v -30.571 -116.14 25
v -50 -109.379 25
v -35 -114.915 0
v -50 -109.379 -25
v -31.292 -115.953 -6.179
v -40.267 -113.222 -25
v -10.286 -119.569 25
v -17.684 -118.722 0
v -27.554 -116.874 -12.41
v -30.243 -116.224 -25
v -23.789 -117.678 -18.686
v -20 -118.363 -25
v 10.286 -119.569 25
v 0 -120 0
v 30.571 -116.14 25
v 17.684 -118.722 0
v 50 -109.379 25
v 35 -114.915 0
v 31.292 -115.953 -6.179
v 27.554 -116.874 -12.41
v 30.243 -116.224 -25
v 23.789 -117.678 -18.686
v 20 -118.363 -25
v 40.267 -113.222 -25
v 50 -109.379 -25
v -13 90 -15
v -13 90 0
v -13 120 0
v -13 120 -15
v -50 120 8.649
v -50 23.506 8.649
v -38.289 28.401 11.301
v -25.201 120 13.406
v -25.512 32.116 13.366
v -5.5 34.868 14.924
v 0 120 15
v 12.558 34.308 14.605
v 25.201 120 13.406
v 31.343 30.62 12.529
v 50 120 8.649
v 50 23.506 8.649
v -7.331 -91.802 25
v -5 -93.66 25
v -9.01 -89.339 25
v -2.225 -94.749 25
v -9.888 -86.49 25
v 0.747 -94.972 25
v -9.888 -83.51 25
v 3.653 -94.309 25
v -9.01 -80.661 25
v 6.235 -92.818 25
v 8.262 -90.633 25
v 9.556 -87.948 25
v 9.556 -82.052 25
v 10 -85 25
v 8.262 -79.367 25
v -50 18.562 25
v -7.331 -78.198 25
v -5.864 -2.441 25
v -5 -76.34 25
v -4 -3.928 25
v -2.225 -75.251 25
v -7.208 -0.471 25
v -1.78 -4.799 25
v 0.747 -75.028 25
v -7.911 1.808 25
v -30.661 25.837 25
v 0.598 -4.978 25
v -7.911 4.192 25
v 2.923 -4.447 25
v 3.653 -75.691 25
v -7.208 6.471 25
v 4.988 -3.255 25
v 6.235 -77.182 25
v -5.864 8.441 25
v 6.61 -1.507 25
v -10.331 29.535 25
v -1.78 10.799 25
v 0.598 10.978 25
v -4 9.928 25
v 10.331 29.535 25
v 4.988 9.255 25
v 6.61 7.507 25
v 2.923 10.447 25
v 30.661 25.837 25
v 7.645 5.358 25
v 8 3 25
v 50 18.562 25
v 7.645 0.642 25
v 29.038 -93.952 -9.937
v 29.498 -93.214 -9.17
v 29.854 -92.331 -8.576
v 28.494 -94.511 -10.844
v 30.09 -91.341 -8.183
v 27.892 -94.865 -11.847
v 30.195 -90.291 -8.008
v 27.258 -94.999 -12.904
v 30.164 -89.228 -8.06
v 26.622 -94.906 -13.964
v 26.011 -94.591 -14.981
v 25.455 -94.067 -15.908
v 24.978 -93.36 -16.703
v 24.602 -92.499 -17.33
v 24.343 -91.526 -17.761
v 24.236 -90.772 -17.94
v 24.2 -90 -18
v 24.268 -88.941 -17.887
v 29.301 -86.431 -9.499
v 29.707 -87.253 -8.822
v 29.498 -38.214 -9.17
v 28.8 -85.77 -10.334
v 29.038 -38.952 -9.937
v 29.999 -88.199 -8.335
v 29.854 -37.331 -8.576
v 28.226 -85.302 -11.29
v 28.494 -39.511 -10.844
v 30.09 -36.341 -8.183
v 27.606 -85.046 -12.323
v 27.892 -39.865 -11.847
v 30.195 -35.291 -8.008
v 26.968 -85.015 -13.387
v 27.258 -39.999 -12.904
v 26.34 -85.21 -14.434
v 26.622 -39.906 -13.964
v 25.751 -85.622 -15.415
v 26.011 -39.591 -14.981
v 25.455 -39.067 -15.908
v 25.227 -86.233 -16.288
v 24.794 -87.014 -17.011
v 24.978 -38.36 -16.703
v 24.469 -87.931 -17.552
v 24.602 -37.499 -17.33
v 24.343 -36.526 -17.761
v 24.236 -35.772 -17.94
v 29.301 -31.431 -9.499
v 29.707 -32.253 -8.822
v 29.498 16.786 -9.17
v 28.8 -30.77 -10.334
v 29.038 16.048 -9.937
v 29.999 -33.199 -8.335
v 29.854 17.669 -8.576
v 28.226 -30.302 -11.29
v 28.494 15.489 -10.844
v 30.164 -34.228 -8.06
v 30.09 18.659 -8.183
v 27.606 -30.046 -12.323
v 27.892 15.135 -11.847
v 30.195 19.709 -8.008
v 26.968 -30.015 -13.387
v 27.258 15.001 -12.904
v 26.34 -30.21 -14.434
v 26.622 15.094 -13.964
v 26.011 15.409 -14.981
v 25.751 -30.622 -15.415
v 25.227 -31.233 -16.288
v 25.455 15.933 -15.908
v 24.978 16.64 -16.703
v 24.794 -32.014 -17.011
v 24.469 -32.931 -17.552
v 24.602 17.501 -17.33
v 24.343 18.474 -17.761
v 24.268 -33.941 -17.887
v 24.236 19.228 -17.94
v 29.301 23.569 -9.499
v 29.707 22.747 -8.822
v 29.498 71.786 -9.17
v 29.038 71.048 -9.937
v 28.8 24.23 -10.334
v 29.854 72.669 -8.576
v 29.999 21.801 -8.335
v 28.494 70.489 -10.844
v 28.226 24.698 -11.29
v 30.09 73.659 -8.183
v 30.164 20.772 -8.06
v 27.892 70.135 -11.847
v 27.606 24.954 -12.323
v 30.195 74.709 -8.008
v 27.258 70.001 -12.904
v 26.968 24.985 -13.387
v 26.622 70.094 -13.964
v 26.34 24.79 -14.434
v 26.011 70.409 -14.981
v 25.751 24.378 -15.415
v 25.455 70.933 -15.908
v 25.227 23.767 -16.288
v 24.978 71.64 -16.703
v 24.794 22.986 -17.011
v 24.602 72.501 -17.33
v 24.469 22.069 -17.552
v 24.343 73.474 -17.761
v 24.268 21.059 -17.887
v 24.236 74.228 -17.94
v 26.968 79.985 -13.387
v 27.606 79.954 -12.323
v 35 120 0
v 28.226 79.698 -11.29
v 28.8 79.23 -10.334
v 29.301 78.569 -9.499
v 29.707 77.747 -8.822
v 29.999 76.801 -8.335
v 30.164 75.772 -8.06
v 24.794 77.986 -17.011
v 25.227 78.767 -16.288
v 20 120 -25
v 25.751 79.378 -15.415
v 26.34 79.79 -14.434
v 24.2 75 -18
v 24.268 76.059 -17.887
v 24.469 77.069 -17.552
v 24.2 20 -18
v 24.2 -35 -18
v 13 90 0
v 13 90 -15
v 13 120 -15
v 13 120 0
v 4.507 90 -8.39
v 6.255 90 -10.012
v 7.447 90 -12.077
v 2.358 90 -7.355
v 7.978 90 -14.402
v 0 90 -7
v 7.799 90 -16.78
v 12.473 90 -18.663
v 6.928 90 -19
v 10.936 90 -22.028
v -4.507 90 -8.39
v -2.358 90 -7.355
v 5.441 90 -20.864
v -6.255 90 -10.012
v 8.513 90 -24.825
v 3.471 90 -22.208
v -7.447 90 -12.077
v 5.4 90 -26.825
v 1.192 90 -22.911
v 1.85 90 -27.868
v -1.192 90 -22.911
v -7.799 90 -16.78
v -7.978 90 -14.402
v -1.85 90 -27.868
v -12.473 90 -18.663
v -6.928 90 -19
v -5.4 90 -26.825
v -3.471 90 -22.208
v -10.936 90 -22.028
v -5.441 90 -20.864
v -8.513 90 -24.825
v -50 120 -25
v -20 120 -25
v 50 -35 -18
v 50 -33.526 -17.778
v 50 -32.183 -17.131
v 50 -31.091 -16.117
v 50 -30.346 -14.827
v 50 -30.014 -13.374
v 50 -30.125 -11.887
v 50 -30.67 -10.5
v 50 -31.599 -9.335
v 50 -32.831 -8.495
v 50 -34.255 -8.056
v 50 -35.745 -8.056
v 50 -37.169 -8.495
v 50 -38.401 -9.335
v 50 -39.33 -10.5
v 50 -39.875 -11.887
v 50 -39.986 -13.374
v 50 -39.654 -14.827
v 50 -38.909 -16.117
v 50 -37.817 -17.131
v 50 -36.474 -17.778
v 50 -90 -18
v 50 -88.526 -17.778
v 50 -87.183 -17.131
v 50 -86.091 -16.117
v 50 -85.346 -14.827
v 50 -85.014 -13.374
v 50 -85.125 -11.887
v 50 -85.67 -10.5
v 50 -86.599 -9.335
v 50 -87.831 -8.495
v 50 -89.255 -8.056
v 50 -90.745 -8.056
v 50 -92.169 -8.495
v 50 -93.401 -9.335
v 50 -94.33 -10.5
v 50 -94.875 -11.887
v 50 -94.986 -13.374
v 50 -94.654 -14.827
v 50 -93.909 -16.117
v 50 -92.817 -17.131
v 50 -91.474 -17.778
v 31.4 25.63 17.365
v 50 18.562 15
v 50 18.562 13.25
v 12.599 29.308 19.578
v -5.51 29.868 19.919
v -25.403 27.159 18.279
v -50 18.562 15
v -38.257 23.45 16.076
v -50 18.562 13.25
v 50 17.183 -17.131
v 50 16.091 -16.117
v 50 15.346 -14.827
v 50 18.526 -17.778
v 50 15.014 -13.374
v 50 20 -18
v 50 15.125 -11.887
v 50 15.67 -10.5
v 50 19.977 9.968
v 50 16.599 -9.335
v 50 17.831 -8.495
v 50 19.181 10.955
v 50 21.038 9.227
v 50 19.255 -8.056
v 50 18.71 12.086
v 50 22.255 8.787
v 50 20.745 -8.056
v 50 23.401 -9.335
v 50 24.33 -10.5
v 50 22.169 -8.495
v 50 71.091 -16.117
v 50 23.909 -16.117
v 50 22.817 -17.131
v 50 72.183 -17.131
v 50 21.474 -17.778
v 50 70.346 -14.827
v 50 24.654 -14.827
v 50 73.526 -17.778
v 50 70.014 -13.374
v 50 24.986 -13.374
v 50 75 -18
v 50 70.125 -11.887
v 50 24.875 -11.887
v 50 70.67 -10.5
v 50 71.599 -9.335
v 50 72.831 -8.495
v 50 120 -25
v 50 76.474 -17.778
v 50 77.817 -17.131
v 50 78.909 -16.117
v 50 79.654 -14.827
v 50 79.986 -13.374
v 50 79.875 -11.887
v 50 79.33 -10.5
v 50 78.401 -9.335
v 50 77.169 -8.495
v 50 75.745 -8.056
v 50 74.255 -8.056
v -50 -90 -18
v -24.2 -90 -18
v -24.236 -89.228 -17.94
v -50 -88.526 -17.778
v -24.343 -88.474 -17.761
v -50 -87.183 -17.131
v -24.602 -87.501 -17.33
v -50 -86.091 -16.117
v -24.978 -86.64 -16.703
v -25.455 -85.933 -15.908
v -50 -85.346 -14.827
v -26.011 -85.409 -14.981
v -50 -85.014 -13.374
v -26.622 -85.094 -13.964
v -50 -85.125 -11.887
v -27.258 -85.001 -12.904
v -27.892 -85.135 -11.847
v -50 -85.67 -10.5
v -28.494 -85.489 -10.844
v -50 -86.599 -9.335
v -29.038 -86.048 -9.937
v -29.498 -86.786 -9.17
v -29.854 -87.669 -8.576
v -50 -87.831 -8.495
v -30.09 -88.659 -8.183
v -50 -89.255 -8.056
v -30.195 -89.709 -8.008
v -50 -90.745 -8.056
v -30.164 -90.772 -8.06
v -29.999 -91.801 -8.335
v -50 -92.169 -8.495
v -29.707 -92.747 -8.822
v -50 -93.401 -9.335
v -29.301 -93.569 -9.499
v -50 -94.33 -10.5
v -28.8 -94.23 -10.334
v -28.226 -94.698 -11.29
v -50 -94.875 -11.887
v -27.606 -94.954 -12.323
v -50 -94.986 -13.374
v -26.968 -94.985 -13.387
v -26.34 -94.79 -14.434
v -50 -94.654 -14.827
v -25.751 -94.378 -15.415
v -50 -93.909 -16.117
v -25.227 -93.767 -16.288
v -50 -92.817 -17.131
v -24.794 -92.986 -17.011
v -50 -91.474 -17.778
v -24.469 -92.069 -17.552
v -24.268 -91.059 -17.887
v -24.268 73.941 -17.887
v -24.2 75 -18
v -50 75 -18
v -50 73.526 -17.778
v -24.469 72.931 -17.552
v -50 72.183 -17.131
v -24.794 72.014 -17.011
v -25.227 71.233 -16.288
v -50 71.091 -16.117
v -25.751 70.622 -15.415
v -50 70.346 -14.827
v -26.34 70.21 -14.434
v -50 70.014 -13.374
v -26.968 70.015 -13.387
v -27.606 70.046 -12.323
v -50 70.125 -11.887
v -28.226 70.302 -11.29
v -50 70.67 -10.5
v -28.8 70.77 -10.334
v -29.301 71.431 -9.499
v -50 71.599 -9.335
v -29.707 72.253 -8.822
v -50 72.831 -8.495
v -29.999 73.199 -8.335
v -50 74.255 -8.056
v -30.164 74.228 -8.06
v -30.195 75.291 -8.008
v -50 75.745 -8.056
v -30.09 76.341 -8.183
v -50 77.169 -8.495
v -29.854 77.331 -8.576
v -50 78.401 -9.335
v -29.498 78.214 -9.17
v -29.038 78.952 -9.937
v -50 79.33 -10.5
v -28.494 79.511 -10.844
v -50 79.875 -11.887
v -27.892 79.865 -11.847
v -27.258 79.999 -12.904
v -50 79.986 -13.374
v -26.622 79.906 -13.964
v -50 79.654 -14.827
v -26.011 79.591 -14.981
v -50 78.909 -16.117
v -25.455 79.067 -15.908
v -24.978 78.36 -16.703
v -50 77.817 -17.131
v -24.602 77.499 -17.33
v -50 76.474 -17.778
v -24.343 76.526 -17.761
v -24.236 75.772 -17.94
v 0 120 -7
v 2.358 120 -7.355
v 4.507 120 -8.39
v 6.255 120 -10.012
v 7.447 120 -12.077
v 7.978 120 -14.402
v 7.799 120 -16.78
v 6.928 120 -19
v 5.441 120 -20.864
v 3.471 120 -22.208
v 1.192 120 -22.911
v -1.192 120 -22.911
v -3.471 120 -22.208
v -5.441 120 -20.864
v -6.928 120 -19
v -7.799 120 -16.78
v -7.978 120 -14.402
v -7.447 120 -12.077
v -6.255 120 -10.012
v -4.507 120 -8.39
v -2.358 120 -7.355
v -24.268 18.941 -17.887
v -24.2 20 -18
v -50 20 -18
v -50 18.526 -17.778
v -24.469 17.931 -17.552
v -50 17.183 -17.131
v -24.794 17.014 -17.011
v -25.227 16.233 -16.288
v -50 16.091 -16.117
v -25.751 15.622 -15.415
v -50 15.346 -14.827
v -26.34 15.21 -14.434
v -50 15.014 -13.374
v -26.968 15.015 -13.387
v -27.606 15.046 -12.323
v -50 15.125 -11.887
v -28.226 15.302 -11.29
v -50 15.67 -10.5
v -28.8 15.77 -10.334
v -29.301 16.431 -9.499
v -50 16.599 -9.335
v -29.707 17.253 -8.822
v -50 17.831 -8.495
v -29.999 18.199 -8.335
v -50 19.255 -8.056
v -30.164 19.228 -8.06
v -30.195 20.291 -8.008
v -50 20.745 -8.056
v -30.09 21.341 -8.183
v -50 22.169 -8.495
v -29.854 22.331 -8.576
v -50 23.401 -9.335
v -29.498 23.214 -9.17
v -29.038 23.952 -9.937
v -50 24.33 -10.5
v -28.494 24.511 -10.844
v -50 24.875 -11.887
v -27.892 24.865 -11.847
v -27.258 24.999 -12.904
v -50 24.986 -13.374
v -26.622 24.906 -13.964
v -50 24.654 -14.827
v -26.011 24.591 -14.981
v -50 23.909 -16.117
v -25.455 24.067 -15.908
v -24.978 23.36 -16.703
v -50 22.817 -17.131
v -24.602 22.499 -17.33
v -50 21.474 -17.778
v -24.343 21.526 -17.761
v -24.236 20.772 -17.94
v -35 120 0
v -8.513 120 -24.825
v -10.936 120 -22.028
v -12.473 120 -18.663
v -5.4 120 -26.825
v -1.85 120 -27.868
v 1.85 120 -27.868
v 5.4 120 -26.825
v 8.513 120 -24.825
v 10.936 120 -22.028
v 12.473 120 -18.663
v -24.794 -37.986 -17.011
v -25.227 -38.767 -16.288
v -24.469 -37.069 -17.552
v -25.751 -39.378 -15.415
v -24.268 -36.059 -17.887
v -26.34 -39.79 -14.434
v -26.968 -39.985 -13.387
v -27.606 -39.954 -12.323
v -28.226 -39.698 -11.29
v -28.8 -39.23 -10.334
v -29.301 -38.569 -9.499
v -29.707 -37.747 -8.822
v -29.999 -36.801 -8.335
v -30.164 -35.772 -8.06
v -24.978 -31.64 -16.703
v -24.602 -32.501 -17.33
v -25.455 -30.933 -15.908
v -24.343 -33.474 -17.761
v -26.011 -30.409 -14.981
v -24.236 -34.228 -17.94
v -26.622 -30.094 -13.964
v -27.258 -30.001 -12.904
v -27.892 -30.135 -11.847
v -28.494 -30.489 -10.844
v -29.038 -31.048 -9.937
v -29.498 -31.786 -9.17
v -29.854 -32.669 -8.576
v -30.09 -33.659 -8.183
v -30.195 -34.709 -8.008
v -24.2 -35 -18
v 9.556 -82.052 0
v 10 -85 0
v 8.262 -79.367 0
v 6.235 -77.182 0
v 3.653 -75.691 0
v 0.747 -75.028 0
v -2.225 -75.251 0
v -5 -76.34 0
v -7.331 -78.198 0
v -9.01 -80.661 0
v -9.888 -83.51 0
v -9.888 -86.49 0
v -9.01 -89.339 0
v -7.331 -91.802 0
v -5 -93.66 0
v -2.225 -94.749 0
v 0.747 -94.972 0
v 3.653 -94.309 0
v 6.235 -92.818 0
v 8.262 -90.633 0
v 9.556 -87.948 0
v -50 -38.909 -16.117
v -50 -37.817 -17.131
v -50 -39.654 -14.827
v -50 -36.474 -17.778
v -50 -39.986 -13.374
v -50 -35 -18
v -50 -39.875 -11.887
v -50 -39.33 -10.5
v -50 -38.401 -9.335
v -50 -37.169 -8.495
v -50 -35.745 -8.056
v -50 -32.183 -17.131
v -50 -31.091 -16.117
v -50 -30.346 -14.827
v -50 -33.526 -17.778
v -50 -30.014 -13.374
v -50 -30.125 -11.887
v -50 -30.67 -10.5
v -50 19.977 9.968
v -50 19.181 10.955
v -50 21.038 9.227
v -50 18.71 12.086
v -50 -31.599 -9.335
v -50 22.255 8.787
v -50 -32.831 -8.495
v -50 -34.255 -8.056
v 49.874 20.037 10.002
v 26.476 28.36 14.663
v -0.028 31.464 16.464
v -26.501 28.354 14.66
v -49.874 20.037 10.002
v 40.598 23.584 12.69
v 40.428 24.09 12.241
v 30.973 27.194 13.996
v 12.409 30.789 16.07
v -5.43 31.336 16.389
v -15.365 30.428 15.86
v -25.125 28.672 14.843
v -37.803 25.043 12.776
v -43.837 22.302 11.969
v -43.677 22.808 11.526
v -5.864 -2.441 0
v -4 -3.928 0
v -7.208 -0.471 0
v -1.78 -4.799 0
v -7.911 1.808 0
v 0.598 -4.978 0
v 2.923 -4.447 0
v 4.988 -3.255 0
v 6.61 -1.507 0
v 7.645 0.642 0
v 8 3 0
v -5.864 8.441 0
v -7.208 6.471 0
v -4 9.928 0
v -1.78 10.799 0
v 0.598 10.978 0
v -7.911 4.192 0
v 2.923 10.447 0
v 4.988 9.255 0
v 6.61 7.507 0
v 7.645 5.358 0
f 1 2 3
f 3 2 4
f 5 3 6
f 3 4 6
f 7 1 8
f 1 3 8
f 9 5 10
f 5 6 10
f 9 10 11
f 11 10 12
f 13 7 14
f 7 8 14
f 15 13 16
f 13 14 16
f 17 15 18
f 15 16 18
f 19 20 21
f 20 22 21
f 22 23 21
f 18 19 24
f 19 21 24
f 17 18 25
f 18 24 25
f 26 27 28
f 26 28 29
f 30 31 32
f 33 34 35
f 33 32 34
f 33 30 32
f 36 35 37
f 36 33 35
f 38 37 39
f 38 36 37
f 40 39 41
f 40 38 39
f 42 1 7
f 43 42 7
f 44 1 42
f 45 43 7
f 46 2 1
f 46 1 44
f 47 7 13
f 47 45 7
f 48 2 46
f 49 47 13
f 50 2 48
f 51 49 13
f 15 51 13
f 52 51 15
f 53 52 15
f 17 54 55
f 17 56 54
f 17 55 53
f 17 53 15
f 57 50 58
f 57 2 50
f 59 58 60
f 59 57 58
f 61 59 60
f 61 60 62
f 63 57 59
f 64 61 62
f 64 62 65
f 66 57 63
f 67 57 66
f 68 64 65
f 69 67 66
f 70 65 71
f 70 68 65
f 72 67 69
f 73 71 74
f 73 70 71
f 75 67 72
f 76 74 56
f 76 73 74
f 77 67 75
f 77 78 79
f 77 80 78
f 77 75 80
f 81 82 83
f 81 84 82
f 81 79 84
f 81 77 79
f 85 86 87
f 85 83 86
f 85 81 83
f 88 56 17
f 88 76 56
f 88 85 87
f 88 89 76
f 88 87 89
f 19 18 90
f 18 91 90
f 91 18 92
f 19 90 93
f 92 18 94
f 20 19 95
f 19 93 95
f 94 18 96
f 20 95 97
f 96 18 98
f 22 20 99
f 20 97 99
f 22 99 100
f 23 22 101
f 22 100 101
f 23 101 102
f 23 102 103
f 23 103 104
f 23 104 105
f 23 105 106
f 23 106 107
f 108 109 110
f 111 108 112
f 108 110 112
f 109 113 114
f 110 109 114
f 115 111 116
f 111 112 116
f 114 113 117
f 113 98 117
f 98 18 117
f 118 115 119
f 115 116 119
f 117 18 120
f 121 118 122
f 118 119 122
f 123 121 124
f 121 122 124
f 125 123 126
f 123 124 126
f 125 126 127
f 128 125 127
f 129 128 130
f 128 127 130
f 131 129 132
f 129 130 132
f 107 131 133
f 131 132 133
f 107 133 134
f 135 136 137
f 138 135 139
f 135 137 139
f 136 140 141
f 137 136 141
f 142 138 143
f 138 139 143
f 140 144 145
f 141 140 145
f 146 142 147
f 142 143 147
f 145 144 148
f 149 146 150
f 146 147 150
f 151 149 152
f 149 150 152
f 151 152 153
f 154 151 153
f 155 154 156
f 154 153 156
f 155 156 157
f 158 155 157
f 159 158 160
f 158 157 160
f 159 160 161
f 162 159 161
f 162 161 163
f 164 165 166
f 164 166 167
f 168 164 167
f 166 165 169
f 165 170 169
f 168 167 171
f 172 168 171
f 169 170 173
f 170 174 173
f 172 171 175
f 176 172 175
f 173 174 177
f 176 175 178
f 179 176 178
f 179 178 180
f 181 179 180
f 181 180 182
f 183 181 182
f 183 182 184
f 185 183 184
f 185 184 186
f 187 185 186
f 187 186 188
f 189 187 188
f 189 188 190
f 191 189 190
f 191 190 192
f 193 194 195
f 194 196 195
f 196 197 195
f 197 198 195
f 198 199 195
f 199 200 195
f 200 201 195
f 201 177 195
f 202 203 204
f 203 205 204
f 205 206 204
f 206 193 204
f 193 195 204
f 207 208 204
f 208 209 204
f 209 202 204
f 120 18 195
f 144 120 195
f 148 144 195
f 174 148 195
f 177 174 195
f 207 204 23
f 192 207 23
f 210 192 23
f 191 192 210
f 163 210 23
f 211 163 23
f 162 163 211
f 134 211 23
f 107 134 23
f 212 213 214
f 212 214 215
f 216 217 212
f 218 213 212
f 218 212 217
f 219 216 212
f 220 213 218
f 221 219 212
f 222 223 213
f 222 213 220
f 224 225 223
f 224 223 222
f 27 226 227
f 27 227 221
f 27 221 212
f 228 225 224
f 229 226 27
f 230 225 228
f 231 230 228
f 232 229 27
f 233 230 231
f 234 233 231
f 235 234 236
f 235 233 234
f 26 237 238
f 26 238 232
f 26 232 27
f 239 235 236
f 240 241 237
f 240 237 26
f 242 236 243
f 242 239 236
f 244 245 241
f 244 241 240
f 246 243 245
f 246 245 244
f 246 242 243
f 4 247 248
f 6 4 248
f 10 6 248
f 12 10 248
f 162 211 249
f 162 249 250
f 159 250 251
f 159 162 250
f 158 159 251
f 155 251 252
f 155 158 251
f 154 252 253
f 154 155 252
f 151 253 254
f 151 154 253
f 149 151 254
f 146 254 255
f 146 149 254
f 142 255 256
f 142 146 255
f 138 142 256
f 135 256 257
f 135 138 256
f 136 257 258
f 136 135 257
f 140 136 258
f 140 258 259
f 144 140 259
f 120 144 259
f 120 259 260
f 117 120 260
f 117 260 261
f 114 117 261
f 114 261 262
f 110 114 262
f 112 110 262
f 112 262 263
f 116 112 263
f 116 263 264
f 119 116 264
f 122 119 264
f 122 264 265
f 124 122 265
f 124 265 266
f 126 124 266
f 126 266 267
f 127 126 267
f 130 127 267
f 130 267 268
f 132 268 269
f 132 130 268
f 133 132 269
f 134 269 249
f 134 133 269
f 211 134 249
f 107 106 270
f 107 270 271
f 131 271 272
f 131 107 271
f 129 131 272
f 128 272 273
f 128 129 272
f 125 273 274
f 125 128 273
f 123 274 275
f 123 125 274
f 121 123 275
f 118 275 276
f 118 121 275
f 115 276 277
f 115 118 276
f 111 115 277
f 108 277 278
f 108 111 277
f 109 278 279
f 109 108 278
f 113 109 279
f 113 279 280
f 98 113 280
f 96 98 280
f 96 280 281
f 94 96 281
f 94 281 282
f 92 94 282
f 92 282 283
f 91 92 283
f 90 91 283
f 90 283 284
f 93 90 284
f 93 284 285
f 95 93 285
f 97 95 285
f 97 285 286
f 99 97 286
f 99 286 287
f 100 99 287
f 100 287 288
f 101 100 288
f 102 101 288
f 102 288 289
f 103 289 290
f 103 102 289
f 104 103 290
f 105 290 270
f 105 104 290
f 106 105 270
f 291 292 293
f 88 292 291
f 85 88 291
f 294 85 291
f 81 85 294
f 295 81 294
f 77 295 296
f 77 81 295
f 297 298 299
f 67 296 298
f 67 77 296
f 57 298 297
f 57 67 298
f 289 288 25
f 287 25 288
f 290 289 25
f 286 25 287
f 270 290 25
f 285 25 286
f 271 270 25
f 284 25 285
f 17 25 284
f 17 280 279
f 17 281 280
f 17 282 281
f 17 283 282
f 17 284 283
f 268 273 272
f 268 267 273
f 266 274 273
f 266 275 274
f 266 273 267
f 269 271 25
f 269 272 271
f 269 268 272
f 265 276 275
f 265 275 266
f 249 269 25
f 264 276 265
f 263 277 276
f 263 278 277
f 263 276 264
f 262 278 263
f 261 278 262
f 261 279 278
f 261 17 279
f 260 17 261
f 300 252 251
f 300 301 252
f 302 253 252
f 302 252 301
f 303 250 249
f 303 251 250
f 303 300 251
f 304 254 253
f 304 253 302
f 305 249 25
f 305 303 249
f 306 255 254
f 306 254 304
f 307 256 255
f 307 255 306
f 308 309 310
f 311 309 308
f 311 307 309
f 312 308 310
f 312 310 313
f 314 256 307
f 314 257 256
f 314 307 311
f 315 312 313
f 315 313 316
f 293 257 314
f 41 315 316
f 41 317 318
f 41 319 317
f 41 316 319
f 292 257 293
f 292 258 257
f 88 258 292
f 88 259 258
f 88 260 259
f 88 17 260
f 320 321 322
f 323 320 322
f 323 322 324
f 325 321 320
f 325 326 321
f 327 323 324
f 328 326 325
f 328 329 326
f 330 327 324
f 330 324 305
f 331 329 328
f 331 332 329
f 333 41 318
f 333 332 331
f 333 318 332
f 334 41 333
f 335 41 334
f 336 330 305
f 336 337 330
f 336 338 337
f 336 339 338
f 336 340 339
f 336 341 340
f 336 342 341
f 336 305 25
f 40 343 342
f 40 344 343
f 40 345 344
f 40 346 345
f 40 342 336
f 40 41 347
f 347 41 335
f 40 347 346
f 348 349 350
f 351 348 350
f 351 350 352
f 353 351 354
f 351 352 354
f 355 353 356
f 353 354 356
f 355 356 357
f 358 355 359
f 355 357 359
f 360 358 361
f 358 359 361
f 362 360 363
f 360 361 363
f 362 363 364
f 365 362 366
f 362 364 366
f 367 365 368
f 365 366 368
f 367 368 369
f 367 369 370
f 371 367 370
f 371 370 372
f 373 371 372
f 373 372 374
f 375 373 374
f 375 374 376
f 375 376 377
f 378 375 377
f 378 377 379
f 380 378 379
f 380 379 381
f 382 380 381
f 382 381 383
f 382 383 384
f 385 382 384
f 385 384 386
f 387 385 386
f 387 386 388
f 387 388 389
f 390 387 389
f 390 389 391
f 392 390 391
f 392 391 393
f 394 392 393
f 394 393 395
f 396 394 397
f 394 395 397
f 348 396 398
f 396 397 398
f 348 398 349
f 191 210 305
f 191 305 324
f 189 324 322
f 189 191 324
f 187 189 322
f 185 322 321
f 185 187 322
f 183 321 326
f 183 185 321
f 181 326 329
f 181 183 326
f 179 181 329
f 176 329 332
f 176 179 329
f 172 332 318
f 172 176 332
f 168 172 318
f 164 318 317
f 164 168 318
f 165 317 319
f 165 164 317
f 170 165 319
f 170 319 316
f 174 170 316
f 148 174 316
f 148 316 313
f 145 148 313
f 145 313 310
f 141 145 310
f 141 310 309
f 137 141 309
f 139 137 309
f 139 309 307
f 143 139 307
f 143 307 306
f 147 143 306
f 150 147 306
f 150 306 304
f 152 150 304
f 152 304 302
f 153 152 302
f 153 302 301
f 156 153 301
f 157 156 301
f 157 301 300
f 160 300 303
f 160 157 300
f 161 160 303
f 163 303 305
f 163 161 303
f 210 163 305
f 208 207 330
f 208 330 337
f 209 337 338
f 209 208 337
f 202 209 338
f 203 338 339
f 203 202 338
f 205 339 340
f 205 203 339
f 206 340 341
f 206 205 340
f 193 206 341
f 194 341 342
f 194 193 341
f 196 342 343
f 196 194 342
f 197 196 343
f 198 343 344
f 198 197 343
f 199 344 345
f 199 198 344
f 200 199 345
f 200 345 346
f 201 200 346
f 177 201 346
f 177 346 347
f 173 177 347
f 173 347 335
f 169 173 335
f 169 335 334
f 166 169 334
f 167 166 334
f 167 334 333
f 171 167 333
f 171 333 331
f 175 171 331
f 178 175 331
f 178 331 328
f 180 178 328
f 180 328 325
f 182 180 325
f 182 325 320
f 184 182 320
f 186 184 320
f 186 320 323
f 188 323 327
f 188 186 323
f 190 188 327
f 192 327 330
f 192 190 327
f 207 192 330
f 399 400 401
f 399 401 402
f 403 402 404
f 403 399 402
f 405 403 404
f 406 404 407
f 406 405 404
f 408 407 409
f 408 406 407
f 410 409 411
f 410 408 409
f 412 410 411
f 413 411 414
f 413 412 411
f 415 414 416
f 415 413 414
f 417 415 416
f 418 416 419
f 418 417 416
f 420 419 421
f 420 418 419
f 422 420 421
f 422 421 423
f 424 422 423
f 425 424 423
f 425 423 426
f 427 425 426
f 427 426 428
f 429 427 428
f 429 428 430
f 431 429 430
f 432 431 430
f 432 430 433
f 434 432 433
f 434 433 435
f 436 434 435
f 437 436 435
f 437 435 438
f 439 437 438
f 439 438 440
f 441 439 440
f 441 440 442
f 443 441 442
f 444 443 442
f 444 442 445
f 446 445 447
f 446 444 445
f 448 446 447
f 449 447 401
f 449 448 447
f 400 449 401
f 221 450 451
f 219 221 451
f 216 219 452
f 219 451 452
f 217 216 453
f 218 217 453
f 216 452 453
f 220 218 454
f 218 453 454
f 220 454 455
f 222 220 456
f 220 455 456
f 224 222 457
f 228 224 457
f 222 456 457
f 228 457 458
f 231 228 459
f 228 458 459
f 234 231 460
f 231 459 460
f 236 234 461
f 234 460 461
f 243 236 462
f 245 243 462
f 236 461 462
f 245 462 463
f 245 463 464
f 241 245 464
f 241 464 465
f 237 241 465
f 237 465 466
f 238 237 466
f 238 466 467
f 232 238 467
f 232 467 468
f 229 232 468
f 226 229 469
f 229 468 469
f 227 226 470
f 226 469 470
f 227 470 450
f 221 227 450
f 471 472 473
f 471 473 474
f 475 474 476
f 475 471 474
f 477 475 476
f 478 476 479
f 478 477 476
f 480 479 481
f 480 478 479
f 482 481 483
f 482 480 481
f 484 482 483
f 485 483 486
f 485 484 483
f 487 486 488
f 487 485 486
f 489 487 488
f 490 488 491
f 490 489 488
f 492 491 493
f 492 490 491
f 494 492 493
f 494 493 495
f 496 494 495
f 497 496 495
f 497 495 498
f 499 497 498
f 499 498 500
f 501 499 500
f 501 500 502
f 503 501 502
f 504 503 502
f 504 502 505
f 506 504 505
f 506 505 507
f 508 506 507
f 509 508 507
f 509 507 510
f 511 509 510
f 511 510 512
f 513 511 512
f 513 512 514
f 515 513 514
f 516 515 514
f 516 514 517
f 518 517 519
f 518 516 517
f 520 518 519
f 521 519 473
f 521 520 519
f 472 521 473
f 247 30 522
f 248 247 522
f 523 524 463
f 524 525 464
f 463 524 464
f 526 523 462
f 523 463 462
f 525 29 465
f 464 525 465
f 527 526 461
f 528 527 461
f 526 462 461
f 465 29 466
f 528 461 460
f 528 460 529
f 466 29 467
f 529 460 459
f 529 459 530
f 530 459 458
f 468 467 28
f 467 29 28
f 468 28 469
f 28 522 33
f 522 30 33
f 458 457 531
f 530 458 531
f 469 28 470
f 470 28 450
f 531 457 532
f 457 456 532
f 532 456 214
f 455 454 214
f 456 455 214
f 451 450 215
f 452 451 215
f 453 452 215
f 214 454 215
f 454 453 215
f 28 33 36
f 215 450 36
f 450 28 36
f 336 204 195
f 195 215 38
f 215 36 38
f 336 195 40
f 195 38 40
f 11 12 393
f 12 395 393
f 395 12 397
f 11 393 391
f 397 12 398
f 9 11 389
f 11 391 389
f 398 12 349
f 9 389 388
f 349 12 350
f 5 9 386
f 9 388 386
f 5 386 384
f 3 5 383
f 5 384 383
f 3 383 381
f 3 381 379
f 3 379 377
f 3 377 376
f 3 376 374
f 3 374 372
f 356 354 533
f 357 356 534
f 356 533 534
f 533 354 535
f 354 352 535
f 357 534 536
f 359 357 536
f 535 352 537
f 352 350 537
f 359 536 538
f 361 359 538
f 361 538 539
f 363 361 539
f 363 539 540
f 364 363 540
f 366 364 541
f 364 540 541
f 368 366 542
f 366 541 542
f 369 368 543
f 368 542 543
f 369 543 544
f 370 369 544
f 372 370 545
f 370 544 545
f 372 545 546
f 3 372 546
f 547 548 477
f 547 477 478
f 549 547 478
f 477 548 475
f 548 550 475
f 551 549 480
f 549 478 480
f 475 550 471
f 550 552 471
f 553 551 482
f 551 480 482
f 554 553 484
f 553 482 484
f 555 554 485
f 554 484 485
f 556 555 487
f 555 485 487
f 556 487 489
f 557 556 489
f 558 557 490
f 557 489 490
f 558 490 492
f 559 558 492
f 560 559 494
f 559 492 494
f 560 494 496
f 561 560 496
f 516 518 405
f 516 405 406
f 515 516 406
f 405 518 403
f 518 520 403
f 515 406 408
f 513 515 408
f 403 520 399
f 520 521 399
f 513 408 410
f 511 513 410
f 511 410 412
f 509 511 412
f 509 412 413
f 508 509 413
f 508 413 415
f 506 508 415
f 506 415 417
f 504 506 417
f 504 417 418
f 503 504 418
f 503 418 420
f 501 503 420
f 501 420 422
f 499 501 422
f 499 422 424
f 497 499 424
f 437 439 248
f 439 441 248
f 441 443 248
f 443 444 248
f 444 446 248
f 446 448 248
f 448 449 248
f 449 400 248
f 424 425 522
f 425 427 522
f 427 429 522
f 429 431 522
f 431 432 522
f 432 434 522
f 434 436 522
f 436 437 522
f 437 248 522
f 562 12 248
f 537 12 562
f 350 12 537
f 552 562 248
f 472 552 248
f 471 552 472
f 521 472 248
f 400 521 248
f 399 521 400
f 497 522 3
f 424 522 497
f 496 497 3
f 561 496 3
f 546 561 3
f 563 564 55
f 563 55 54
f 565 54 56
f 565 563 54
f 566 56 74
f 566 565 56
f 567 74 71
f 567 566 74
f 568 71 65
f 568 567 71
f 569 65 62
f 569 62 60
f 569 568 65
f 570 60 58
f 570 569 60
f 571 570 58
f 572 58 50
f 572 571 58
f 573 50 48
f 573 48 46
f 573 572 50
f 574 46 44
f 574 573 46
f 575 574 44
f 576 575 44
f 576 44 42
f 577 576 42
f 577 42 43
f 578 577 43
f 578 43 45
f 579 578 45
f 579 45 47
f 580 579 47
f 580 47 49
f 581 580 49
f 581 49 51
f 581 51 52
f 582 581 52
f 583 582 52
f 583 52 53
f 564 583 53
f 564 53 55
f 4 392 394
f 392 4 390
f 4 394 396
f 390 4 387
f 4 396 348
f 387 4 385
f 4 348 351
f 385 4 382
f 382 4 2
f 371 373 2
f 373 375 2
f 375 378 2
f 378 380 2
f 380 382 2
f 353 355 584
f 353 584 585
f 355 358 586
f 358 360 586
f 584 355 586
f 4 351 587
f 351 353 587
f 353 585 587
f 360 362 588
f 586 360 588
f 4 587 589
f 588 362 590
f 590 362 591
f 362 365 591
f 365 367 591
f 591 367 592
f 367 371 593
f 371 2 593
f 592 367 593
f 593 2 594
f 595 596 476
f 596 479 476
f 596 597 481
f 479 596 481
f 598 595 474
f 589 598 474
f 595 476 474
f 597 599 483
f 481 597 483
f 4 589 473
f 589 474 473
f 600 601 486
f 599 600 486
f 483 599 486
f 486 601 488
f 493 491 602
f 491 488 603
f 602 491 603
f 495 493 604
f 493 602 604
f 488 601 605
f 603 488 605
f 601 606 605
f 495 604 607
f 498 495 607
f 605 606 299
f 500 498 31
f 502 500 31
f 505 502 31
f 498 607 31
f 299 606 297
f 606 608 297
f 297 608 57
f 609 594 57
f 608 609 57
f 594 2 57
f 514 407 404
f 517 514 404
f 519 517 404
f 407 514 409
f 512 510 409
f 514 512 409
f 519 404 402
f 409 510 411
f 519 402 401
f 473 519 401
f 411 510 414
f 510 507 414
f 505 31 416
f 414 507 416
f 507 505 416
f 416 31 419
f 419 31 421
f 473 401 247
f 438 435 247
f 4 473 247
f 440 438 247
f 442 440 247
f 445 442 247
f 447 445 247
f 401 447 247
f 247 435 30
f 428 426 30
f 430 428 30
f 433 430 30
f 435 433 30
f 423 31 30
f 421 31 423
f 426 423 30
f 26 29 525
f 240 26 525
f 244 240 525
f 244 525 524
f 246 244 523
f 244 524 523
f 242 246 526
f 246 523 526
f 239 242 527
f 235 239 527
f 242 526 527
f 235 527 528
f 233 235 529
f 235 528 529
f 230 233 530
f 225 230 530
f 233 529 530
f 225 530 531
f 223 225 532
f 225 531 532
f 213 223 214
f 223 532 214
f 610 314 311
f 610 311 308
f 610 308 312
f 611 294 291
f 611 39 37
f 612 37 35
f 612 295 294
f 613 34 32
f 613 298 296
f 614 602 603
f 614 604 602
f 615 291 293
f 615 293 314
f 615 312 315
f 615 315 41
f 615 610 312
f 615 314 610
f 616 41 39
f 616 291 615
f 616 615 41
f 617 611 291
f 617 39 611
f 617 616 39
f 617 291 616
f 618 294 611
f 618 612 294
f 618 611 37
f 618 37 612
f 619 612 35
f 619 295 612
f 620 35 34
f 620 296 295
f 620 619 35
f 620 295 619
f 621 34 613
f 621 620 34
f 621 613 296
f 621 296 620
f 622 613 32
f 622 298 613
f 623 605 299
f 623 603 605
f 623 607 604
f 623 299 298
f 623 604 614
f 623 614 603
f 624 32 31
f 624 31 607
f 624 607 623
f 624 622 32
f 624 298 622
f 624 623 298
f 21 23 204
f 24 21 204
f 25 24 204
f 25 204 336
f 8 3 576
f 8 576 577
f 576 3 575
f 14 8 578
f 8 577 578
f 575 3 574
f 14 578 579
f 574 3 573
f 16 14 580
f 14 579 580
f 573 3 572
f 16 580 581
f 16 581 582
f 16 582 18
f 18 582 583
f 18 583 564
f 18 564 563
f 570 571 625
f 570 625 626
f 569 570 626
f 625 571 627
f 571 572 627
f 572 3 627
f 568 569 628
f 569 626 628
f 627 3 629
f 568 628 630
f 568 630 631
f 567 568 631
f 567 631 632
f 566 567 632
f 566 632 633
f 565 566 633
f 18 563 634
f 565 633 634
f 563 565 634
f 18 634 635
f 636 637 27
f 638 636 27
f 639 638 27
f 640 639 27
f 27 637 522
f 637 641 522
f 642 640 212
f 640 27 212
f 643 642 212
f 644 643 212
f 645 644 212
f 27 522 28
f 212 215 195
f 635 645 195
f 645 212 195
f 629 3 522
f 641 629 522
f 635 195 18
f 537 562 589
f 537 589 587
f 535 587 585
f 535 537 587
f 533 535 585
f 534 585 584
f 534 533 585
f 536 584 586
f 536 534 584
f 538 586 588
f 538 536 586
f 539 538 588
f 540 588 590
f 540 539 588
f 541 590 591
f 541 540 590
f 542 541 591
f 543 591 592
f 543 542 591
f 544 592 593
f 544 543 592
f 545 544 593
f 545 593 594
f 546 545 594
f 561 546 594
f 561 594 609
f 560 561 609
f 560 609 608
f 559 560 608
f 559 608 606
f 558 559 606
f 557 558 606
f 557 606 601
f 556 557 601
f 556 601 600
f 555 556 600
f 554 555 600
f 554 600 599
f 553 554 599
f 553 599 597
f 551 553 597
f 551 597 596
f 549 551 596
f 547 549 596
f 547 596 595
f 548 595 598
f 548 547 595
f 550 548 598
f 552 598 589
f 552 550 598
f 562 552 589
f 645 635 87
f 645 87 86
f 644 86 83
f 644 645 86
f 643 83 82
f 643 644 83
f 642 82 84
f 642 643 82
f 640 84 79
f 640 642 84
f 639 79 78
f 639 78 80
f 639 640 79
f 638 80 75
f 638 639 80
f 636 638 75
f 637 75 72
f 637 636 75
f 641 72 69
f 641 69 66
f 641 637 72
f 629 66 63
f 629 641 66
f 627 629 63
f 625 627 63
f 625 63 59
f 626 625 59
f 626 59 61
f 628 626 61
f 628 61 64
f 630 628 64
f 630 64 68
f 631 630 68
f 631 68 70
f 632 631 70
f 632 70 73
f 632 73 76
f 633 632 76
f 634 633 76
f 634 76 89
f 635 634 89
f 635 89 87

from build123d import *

# Parameters (mm, degrees)
SKETCH1_W               = 100
SKETCH1_H               = 240
SKETCH1_R               = 8
SKETCH1_R_2             = 10
BOSS_EXTRUDE1_DEPTH     = 25
SKETCH2_OUTSIDE_W       = 154.952
SKETCH2_OUTSIDE_H       = 294.952
SKETCH2_OUTSIDE_R       = 10
SKETCH2_OUTSIDE_R_2     = 8
CUT_EXTRUDE1_DEPTH      = 10
CUT_EXTRUDE2_START      = -50
SKETCH3_OUTSIDE_W       = 154.952
SKETCH3_OUTSIDE_H       = 294.952
CUT_EXTRUDE2_DEPTH      = 50
CUT_EXTRUDE7_REACH      = 242
SKETCH8_R               = 8
BOSS_EXTRUDE2_DEPTH     = 30
CUT_EXTRUDE8_REACH      = 242
CUT_EXTRUDE8_END_RADIUS = 115
CUT_EXTRUDE9_START      = -25.8
SKETCH10_R              = 5
CUT_EXTRUDE9_DEPTH      = 25.8
LPATTERN1_COUNT         = 4
LPATTERN1_PITCH         = 55
MIRROR1_START           = -25.8
MIRROR1_COPY_1_SKETCH_R = 5
MIRROR1_COPY_1_DEPTH    = 25.8
MIRROR1_COPY_2_SKETCH_R = 5
MIRROR1_COPY_2_DEPTH    = 25.8
MIRROR1_COPY_3_SKETCH_R = 5
MIRROR1_COPY_3_DEPTH    = 25.8
FILLET1_R               = 5


with BuildPart() as part:
    # Sketch1 → Boss-Extrude1 (new body, symmetric)
    with BuildSketch(Plane.XY):
        Rectangle(SKETCH1_W, SKETCH1_H)
        with Locations((0, 3)):
            Circle(SKETCH1_R, mode=Mode.SUBTRACT)
        with Locations((0, -85)):
            Circle(SKETCH1_R_2, mode=Mode.SUBTRACT)
    extrude(amount=BOSS_EXTRUDE1_DEPTH, both=True)

    # Sketch2 outside → Cut-Extrude1 (cut)
    with BuildSketch(Plane.XY.offset(25)):
        Rectangle(SKETCH2_OUTSIDE_W, SKETCH2_OUTSIDE_H)
        with BuildLine():
            Line((50, -120), (50, 18.561575886))
            ThreePointArc((50, 18.561575886), (0, 30), (-50, 18.561575886))
            Line((-50, 18.561575886), (-50, -120))
            Line((-50, -120), (50, -120))
        make_face(mode=Mode.SUBTRACT)
        with Locations((0, -85)):
            Circle(SKETCH2_OUTSIDE_R)
        with Locations((0, 3)):
            Circle(SKETCH2_OUTSIDE_R_2)
    extrude(amount=-CUT_EXTRUDE1_DEPTH, mode=Mode.SUBTRACT)

    # Sketch3 outside → Cut-Extrude2 (cut)
    with BuildSketch(Plane.XY.offset(25).offset(CUT_EXTRUDE2_START)):
        Rectangle(SKETCH3_OUTSIDE_W, SKETCH3_OUTSIDE_H)
        with BuildLine():
            Line((50, 120), (-50, 120))
            Line((-50, 120), (-50, -109.378823628))
            ThreePointArc((-50, -109.378823628), (0, -120), (50, -109.378823628))
            Line((50, -109.378823628), (50, 120))
        make_face(mode=Mode.SUBTRACT)
    extrude(amount=CUT_EXTRUDE2_DEPTH, mode=Mode.SUBTRACT)

    # Sketch7 → Cut-Extrude7 (cut, up to next)
    with BuildSketch(Plane(origin=(0, 120, 0), x_dir=(1, 0, 0), z_dir=(0, 1, 0)), mode=Mode.PRIVATE) as cut_extrude7_sk1:
        Polygon((-35, 0), (35, 0), (20, 25), (-20, 25), align=None)
    cut_extrude7_tool1 = extrude(cut_extrude7_sk1.sketch, amount=-CUT_EXTRUDE7_REACH, mode=Mode.PRIVATE) & part.part
    add(cut_extrude7_tool1.solids().sort_by_distance((0, 120, -11.363636))[0], mode=Mode.SUBTRACT)

    # Sketch8 → Boss-Extrude2 (add)
    with BuildSketch(Plane(origin=(0, 120, 0), x_dir=(1, 0, 0), z_dir=(0, 1, 0))):
        with BuildLine():
            Line((13, 15), (13, 0))
            Line((13, 0), (-13, 0))
            Line((-13, 0), (-13, 15))
            ThreePointArc((-13, 15), (0, 28), (13, 15))
        make_face()
        with Locations(Location((0, 15, 0), (0, 0, 270))):  # turned: the seam where the file's is
            Circle(SKETCH8_R, mode=Mode.SUBTRACT)
    extrude(amount=-BOSS_EXTRUDE2_DEPTH)

    # Cut-Extrude8: up to this cylinder (the profile starts outside it)
    cut_extrude8_end = Plane(origin=(0, -85, 18.800927), z_dir=(0, 0, 1)) * Cylinder(CUT_EXTRUDE8_END_RADIUS, 715, mode=Mode.PRIVATE)
    # Sketch9 → Cut-Extrude8 (cut, up to the surface)
    with BuildSketch(Plane(origin=(0, 120, 0), x_dir=(1, 0, 0), z_dir=(0, 1, 0)), mode=Mode.PRIVATE) as cut_extrude8_sk1:
        with BuildLine():
            Line((50, -8.64916731), (50, -25))
            Line((50, -25), (-50, -25))
            Line((-50, -25), (-50, -8.64916731))
            ThreePointArc((-50, -8.64916731), (0, -15), (50, -8.64916731))
        make_face()
    cut_extrude8_tool1 = extrude(cut_extrude8_sk1.sketch, amount=-CUT_EXTRUDE8_REACH, mode=Mode.PRIVATE) - cut_extrude8_end
    add(cut_extrude8_tool1.solids().sort_by_distance((0, 120, 18.800927))[0], mode=Mode.SUBTRACT)

    # Sketch10 → Cut-Extrude9 (cut)
    with BuildSketch(Plane(origin=(50, 0, 0), x_dir=(0, 0, -1), z_dir=(1, 0, 0)).offset(CUT_EXTRUDE9_START)):
        with Locations((13, -90)):
            Circle(SKETCH10_R)
    cut_extrude9 = extrude(amount=CUT_EXTRUDE9_DEPTH, mode=Mode.SUBTRACT)

    # LPattern1: Cut-Extrude9 ×4
    with Locations(*[(0, i * LPATTERN1_PITCH, 0) for i in range(1, LPATTERN1_COUNT)]):
        add(cut_extrude9, mode=Mode.SUBTRACT)

    # Mirror1: Cut-Extrude9 across plane
    add(cut_extrude9.mirror(Plane(origin=(0, 0, 0), x_dir=(0, 0, 1), z_dir=(1, 0, 0))), mode=Mode.SUBTRACT)

    # Mirror1 copy 1 sketch → Mirror1 copy 1 (cut)
    with BuildSketch(Plane(origin=(-50, 55, 0), x_dir=(0, 0, -1), z_dir=(-1, 0, 0)).offset(MIRROR1_START)):
        with Locations((13, 90)):
            Circle(MIRROR1_COPY_1_SKETCH_R)
    extrude(amount=MIRROR1_COPY_1_DEPTH, mode=Mode.SUBTRACT)

    # Mirror1 copy 2 sketch → Mirror1 copy 2 (cut)
    with BuildSketch(Plane(origin=(-50, 110, 0), x_dir=(0, 0, -1), z_dir=(-1, 0, 0)).offset(MIRROR1_START)):
        with Locations((13, 90)):
            Circle(MIRROR1_COPY_2_SKETCH_R)
    extrude(amount=MIRROR1_COPY_2_DEPTH, mode=Mode.SUBTRACT)

    # Mirror1 copy 3 sketch → Mirror1 copy 3 (cut)
    with BuildSketch(Plane(origin=(-50, 165, 0), x_dir=(0, 0, -1), z_dir=(-1, 0, 0)).offset(MIRROR1_START)):
        with Locations((13, 90)):
            Circle(MIRROR1_COPY_3_SKETCH_R)
    extrude(amount=MIRROR1_COPY_3_DEPTH, mode=Mode.SUBTRACT)

    # Fillet1
    fillet1_edges = [part.edges().sort_by_distance(p)[0] for p in [
        (-1e-09, 30, 15),
    ]]
    fillet(fillet1_edges, radius=FILLET1_R)


solid = part.part
